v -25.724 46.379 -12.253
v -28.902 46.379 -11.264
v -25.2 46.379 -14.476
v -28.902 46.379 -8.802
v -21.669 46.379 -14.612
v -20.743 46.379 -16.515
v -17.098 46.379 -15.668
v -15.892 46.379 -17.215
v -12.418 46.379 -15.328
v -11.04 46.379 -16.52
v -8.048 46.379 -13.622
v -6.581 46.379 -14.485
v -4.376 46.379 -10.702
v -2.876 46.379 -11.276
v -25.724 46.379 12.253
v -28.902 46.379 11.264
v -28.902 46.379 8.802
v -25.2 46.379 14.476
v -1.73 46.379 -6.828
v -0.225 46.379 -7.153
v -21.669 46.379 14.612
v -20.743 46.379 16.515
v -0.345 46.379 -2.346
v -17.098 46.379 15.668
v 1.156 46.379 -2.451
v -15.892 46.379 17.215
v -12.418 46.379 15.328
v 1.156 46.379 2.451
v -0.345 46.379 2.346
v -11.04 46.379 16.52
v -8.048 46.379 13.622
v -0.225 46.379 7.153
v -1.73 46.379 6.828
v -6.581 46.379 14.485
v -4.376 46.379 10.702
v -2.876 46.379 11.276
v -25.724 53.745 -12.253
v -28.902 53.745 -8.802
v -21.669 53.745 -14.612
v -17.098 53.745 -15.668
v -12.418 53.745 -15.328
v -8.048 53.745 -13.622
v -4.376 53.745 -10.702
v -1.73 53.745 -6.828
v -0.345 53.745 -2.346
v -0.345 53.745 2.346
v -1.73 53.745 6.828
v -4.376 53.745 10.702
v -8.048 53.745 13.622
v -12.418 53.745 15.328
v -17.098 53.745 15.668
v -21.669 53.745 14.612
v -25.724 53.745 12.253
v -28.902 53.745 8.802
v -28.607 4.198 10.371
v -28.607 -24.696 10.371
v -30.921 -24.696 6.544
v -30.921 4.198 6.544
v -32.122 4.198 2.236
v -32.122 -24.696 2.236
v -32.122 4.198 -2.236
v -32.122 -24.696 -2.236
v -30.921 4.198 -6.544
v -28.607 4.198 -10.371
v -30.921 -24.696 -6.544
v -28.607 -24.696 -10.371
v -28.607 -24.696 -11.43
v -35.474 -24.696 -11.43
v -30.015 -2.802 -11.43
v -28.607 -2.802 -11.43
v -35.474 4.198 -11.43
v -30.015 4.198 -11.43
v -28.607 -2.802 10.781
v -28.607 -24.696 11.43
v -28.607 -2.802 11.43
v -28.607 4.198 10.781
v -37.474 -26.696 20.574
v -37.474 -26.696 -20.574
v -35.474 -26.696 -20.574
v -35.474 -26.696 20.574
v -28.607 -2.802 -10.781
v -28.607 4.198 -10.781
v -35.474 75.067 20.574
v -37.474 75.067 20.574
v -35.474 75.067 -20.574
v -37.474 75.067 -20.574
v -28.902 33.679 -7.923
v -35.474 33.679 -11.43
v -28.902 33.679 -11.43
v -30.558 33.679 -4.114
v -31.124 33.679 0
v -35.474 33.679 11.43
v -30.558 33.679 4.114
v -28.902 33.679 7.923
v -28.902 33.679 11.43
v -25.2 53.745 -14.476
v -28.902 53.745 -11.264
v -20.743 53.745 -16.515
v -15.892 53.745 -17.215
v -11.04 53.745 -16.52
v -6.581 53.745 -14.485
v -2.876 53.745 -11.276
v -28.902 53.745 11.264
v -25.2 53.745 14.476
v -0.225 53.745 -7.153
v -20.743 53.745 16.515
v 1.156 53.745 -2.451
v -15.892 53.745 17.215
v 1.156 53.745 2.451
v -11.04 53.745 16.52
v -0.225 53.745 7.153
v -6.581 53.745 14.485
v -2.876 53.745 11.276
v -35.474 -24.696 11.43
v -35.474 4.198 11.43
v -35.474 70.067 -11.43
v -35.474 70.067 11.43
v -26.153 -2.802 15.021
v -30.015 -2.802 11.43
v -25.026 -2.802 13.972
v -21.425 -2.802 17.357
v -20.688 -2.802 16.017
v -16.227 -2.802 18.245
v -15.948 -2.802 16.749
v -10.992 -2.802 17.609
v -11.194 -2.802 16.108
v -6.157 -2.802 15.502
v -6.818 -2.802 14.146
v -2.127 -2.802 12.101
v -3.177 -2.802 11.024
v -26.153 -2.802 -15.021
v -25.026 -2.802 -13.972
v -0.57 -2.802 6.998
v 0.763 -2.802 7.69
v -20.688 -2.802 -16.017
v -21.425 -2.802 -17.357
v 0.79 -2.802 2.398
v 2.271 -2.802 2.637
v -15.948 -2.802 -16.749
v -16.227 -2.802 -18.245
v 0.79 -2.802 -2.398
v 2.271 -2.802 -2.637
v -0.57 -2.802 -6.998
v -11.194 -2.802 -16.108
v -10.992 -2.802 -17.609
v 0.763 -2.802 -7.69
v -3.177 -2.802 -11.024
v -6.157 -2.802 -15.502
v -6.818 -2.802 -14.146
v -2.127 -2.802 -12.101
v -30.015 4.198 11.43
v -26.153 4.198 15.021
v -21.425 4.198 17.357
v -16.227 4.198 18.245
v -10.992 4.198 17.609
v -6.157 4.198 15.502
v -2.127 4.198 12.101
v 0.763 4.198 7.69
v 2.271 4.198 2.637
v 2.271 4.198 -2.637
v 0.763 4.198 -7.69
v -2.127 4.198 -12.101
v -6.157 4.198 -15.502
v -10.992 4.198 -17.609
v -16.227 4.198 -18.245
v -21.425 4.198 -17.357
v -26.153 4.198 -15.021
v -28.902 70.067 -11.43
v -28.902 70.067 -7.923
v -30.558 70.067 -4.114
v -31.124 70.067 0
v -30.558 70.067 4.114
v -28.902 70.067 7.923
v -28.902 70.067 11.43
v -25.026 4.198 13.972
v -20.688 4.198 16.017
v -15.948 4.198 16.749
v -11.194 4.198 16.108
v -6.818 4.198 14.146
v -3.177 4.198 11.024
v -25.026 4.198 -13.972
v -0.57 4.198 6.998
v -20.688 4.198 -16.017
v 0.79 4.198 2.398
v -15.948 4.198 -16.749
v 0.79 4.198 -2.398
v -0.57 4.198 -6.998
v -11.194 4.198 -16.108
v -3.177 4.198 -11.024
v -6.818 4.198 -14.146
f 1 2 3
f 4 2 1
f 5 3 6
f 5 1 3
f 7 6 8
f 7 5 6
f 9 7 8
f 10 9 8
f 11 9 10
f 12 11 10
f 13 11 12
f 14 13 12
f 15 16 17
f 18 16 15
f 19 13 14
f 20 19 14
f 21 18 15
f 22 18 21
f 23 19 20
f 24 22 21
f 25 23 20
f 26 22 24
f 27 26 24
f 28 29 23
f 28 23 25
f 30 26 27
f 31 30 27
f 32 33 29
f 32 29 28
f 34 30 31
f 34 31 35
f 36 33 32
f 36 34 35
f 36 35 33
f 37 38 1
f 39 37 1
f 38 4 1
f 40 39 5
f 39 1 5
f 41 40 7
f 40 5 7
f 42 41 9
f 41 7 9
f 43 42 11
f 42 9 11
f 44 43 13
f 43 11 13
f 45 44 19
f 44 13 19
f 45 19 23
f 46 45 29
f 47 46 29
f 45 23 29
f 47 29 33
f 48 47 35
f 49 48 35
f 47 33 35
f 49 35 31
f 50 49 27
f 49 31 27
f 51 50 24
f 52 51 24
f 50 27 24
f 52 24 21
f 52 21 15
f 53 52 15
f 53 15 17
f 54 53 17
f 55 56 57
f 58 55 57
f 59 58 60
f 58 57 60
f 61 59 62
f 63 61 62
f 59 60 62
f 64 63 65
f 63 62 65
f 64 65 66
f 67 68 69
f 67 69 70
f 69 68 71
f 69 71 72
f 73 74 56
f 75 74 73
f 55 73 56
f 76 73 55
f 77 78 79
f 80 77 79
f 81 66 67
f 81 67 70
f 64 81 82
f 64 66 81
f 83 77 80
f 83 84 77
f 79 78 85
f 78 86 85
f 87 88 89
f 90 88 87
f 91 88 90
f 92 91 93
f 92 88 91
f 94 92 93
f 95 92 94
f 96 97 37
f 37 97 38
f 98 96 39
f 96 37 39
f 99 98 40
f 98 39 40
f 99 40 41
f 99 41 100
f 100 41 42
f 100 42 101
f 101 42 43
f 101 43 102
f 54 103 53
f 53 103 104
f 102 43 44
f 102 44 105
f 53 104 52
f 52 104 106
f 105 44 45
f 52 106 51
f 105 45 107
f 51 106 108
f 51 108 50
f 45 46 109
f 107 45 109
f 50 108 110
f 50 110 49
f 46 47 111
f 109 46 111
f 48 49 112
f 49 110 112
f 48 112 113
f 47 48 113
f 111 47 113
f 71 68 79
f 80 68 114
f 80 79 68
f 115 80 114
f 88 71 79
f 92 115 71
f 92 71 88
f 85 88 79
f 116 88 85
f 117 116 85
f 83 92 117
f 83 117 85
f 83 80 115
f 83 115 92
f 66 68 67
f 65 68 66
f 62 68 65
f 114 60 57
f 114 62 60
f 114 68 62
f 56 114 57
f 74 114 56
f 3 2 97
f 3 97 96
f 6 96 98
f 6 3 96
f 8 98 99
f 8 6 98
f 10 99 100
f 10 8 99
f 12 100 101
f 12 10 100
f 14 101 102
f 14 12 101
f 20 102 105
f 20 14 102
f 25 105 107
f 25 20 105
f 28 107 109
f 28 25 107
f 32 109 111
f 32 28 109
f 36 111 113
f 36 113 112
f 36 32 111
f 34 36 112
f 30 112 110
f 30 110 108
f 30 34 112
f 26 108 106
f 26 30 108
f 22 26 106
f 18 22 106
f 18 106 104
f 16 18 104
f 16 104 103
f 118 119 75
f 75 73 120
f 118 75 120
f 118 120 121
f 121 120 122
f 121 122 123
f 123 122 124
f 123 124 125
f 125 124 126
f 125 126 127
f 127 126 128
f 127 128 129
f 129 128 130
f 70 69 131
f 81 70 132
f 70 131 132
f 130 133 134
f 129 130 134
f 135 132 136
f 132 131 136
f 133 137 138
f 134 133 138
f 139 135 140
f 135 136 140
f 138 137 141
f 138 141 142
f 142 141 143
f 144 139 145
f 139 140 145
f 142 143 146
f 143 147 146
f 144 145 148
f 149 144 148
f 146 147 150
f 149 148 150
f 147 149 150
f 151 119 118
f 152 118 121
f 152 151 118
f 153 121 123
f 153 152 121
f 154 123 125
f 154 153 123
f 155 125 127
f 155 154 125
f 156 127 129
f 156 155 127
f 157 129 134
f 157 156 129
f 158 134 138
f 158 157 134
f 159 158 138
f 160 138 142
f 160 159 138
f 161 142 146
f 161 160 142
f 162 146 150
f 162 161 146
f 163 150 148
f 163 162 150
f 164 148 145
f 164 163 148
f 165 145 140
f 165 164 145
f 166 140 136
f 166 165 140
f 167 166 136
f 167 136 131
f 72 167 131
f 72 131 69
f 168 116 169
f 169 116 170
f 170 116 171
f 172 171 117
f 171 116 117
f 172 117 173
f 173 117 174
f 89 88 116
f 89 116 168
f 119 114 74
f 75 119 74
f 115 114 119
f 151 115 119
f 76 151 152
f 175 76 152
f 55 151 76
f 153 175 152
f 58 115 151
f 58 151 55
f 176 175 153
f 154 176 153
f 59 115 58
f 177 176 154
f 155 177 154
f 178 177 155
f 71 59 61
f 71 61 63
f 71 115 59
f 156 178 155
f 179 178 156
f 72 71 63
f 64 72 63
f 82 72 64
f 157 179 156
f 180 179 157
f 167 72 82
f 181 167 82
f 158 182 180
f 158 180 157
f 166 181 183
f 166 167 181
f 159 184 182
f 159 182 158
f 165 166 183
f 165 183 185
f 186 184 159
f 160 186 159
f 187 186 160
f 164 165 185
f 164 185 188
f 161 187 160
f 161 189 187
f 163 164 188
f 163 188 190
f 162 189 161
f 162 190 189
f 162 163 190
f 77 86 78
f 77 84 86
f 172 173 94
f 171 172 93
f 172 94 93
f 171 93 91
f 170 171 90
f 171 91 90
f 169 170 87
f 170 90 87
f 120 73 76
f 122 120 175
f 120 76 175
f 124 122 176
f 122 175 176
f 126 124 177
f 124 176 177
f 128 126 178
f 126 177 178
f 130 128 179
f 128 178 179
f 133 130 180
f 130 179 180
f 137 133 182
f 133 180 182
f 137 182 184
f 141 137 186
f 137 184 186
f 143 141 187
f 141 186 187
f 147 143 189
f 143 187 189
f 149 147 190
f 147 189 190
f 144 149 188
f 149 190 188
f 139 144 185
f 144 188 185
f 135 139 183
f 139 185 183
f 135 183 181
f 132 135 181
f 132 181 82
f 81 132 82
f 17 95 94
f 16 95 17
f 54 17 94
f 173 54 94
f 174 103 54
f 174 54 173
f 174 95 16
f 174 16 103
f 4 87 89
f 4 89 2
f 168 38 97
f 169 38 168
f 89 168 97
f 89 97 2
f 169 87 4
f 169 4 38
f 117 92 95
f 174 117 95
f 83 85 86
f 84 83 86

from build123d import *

# Parameters (mm, degrees)
SKETCH1_W                      = 6.866677178
SKETCH1_H                      = 28.893583938
BOSS_EXTRUDE1_DEPTH            = 11.43
SKETCH1_W_2                    = 6.571343666
SKETCH1_H_2                    = 36.38751909
BOSS_EXTRUDE1_2_DEPTH          = 11.43
BOSS_EXTRUDE2_DEPTH            = 20.574
CUT_EXTRUDE1_REACH             = 110.537
SKETCH2_R                      = 16.5
CUT_EXTRUDE1_DIRECTION_2_DEPTH = 35.052
CUT_EXTRUDE4_REACH             = 75.978
SKETCH3_R                      = 15.24
BOSS_EXTRUDE6_START            = -12.7
SKETCH15_R                     = 17.215000066
SKETCH15_R_2                   = 15.715000066
BOSS_EXTRUDE6_DEPTH            = 7.366
SKETCH16_R                     = 18.250000028
SKETCH16_R_2                   = 16.750000028
BOSS_EXTRUDE7_DEPTH            = 7


with BuildPart() as part:
    # Sketch1 → Boss-Extrude1 (new, symmetric)
    with BuildSketch(Plane.XY):
        with Locations((-32.040465484, -10.249157812)):
            Rectangle(SKETCH1_W, SKETCH1_H)
    extrude(amount=BOSS_EXTRUDE1_DEPTH, both=True)



with BuildPart() as body_2:
    # Sketch1 → Boss-Extrude1 2 (new, symmetric)
    with BuildSketch(Plane.XY):
        with Locations((-32.18813224, 51.873158257)):
            Rectangle(SKETCH1_W_2, SKETCH1_H_2)
    extrude(amount=BOSS_EXTRUDE1_2_DEPTH, both=True)


with BuildPart() as part_1:
    add(part.part)

    add(body_2.part)  # Boss-Extrude2 merges body 2
    # Sketch1<3> → Boss-Extrude2 (add, symmetric)
    with BuildSketch(Plane.XY):
        Polygon((-37.473804073, -26.695949781), (-35.473804073, -26.695949781), (-35.473804073, -24.695949781), (-35.473804073, 4.197634157), (-35.473804073, 33.679398712), (-35.473804073, 70.066917802), (-35.473804073, 75.066917802), (-37.473804073, 75.066917802), align=None)
    extrude(amount=BOSS_EXTRUDE2_DEPTH, both=True)

    # Sketch2 → Cut-Extrude1 (cut, up to next)
    with BuildSketch(Plane.XZ.offset(24.695949781), mode=Mode.PRIVATE) as cut_extrude1_sk1:
        with Locations((-15.773804073, 0)):
            Circle(SKETCH2_R)
    cut_extrude1_tool1 = extrude(cut_extrude1_sk1.sketch, amount=-CUT_EXTRUDE1_REACH, mode=Mode.PRIVATE) & part_1.part
    add(cut_extrude1_tool1.solids().sort_by_distance((-15.773804, -24.69595, 0))[0], mode=Mode.SUBTRACT)

    # Sketch2 → Cut-Extrude1 direction 2 (cut)
    with BuildSketch(Plane.XZ.offset(24.695949781)):
        with Locations((-15.773804073, 0)):
            Circle(SKETCH2_R)
    extrude(amount=CUT_EXTRUDE1_DIRECTION_2_DEPTH, mode=Mode.SUBTRACT)

    # Sketch3 → Cut-Extrude4 (cut, up to next)
    with BuildSketch(Plane.XZ.offset(-33.679398712), mode=Mode.PRIVATE) as cut_extrude4_sk1:
        with Locations((-15.883804073, 0)):
            Circle(SKETCH3_R)
    cut_extrude4_tool1 = extrude(cut_extrude4_sk1.sketch, amount=-CUT_EXTRUDE4_REACH, mode=Mode.PRIVATE) & part_1.part
    add(cut_extrude4_tool1.solids().sort_by_distance((-15.883804, 33.679399, 0))[0], mode=Mode.SUBTRACT)

    # Sketch15 → Boss-Extrude6 (add)
    with BuildSketch(Plane.XZ.offset(-33.679398712).offset(BOSS_EXTRUDE6_START)):
        with Locations((-15.883804073, 0)):
            Circle(SKETCH15_R)
        with Locations((-15.883804073, 0)):
            Circle(SKETCH15_R_2, mode=Mode.SUBTRACT)
    extrude(amount=-BOSS_EXTRUDE6_DEPTH)

    # Sketch16 → Boss-Extrude7 (add)
    with BuildSketch(Plane(origin=(0, 4.197634157, 0), x_dir=(1, 0, 0), z_dir=(0, 1, 0))):
        with Locations((-15.787690473, 0)):
            Circle(SKETCH16_R)
        with Locations((-15.787690473, 0)):
            Circle(SKETCH16_R_2, mode=Mode.SUBTRACT)
    extrude(amount=-BOSS_EXTRUDE7_DEPTH)


solid = part_1.part
